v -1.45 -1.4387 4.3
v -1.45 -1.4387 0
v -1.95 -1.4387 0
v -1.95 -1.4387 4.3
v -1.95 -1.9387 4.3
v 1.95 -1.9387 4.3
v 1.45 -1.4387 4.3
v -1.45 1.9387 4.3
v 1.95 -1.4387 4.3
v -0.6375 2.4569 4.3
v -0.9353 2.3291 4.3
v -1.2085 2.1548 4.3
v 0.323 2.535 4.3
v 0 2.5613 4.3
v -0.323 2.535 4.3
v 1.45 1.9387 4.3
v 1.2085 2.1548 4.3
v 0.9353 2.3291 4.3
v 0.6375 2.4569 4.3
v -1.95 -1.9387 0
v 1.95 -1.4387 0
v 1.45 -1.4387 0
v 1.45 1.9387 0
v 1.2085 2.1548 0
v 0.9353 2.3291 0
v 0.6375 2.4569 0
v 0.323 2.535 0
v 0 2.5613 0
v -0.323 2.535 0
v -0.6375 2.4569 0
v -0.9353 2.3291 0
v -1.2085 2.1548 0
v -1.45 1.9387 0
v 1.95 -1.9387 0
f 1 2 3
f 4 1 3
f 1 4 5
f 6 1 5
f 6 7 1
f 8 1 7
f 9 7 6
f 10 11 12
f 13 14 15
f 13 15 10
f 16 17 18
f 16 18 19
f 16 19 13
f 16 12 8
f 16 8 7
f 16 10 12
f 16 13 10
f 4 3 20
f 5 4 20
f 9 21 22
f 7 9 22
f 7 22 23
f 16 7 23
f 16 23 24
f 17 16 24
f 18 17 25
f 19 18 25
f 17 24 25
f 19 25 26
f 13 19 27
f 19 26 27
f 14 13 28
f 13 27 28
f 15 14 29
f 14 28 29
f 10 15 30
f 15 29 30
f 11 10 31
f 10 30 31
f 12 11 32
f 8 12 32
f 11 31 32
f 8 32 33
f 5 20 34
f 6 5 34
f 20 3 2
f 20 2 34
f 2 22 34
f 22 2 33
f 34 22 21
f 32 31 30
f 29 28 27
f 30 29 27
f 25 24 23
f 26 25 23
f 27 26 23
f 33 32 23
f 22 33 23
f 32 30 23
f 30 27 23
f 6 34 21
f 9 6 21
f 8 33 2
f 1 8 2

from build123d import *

# Parameters (mm, degrees)
DODANIE_WYCI_GNI_CIE1_DEPTH = 4.3


with BuildPart() as part:
    # Szkic1 → Dodanie-wyciągnięcie1 (new body)
    with BuildSketch(Plane.XY):
        with BuildLine():
            Line((-1.45, -1.438748866), (-1.95, -1.438748866))
            Line((-1.95, -1.438748866), (-1.95, -1.938748866))
            Line((-1.95, -1.938748866), (-1.45, -1.938748866))
            Line((-1.45, -1.938748866), (1.45, -1.938748866))
            Line((1.45, -1.938748866), (1.95, -1.938748866))
            Line((1.95, -1.938748866), (1.95, -1.438748866))
            Line((1.95, -1.438748866), (1.45, -1.438748866))
            Line((1.45, -1.438748866), (1.45, 1.938748866))
            ThreePointArc((1.45, 1.938748866), (0, 2.561251134), (-1.45, 1.938748866))
            Line((-1.45, 1.938748866), (-1.45, -1.438748866))
        make_face()
    extrude(amount=DODANIE_WYCI_GNI_CIE1_DEPTH)


solid = part.part
